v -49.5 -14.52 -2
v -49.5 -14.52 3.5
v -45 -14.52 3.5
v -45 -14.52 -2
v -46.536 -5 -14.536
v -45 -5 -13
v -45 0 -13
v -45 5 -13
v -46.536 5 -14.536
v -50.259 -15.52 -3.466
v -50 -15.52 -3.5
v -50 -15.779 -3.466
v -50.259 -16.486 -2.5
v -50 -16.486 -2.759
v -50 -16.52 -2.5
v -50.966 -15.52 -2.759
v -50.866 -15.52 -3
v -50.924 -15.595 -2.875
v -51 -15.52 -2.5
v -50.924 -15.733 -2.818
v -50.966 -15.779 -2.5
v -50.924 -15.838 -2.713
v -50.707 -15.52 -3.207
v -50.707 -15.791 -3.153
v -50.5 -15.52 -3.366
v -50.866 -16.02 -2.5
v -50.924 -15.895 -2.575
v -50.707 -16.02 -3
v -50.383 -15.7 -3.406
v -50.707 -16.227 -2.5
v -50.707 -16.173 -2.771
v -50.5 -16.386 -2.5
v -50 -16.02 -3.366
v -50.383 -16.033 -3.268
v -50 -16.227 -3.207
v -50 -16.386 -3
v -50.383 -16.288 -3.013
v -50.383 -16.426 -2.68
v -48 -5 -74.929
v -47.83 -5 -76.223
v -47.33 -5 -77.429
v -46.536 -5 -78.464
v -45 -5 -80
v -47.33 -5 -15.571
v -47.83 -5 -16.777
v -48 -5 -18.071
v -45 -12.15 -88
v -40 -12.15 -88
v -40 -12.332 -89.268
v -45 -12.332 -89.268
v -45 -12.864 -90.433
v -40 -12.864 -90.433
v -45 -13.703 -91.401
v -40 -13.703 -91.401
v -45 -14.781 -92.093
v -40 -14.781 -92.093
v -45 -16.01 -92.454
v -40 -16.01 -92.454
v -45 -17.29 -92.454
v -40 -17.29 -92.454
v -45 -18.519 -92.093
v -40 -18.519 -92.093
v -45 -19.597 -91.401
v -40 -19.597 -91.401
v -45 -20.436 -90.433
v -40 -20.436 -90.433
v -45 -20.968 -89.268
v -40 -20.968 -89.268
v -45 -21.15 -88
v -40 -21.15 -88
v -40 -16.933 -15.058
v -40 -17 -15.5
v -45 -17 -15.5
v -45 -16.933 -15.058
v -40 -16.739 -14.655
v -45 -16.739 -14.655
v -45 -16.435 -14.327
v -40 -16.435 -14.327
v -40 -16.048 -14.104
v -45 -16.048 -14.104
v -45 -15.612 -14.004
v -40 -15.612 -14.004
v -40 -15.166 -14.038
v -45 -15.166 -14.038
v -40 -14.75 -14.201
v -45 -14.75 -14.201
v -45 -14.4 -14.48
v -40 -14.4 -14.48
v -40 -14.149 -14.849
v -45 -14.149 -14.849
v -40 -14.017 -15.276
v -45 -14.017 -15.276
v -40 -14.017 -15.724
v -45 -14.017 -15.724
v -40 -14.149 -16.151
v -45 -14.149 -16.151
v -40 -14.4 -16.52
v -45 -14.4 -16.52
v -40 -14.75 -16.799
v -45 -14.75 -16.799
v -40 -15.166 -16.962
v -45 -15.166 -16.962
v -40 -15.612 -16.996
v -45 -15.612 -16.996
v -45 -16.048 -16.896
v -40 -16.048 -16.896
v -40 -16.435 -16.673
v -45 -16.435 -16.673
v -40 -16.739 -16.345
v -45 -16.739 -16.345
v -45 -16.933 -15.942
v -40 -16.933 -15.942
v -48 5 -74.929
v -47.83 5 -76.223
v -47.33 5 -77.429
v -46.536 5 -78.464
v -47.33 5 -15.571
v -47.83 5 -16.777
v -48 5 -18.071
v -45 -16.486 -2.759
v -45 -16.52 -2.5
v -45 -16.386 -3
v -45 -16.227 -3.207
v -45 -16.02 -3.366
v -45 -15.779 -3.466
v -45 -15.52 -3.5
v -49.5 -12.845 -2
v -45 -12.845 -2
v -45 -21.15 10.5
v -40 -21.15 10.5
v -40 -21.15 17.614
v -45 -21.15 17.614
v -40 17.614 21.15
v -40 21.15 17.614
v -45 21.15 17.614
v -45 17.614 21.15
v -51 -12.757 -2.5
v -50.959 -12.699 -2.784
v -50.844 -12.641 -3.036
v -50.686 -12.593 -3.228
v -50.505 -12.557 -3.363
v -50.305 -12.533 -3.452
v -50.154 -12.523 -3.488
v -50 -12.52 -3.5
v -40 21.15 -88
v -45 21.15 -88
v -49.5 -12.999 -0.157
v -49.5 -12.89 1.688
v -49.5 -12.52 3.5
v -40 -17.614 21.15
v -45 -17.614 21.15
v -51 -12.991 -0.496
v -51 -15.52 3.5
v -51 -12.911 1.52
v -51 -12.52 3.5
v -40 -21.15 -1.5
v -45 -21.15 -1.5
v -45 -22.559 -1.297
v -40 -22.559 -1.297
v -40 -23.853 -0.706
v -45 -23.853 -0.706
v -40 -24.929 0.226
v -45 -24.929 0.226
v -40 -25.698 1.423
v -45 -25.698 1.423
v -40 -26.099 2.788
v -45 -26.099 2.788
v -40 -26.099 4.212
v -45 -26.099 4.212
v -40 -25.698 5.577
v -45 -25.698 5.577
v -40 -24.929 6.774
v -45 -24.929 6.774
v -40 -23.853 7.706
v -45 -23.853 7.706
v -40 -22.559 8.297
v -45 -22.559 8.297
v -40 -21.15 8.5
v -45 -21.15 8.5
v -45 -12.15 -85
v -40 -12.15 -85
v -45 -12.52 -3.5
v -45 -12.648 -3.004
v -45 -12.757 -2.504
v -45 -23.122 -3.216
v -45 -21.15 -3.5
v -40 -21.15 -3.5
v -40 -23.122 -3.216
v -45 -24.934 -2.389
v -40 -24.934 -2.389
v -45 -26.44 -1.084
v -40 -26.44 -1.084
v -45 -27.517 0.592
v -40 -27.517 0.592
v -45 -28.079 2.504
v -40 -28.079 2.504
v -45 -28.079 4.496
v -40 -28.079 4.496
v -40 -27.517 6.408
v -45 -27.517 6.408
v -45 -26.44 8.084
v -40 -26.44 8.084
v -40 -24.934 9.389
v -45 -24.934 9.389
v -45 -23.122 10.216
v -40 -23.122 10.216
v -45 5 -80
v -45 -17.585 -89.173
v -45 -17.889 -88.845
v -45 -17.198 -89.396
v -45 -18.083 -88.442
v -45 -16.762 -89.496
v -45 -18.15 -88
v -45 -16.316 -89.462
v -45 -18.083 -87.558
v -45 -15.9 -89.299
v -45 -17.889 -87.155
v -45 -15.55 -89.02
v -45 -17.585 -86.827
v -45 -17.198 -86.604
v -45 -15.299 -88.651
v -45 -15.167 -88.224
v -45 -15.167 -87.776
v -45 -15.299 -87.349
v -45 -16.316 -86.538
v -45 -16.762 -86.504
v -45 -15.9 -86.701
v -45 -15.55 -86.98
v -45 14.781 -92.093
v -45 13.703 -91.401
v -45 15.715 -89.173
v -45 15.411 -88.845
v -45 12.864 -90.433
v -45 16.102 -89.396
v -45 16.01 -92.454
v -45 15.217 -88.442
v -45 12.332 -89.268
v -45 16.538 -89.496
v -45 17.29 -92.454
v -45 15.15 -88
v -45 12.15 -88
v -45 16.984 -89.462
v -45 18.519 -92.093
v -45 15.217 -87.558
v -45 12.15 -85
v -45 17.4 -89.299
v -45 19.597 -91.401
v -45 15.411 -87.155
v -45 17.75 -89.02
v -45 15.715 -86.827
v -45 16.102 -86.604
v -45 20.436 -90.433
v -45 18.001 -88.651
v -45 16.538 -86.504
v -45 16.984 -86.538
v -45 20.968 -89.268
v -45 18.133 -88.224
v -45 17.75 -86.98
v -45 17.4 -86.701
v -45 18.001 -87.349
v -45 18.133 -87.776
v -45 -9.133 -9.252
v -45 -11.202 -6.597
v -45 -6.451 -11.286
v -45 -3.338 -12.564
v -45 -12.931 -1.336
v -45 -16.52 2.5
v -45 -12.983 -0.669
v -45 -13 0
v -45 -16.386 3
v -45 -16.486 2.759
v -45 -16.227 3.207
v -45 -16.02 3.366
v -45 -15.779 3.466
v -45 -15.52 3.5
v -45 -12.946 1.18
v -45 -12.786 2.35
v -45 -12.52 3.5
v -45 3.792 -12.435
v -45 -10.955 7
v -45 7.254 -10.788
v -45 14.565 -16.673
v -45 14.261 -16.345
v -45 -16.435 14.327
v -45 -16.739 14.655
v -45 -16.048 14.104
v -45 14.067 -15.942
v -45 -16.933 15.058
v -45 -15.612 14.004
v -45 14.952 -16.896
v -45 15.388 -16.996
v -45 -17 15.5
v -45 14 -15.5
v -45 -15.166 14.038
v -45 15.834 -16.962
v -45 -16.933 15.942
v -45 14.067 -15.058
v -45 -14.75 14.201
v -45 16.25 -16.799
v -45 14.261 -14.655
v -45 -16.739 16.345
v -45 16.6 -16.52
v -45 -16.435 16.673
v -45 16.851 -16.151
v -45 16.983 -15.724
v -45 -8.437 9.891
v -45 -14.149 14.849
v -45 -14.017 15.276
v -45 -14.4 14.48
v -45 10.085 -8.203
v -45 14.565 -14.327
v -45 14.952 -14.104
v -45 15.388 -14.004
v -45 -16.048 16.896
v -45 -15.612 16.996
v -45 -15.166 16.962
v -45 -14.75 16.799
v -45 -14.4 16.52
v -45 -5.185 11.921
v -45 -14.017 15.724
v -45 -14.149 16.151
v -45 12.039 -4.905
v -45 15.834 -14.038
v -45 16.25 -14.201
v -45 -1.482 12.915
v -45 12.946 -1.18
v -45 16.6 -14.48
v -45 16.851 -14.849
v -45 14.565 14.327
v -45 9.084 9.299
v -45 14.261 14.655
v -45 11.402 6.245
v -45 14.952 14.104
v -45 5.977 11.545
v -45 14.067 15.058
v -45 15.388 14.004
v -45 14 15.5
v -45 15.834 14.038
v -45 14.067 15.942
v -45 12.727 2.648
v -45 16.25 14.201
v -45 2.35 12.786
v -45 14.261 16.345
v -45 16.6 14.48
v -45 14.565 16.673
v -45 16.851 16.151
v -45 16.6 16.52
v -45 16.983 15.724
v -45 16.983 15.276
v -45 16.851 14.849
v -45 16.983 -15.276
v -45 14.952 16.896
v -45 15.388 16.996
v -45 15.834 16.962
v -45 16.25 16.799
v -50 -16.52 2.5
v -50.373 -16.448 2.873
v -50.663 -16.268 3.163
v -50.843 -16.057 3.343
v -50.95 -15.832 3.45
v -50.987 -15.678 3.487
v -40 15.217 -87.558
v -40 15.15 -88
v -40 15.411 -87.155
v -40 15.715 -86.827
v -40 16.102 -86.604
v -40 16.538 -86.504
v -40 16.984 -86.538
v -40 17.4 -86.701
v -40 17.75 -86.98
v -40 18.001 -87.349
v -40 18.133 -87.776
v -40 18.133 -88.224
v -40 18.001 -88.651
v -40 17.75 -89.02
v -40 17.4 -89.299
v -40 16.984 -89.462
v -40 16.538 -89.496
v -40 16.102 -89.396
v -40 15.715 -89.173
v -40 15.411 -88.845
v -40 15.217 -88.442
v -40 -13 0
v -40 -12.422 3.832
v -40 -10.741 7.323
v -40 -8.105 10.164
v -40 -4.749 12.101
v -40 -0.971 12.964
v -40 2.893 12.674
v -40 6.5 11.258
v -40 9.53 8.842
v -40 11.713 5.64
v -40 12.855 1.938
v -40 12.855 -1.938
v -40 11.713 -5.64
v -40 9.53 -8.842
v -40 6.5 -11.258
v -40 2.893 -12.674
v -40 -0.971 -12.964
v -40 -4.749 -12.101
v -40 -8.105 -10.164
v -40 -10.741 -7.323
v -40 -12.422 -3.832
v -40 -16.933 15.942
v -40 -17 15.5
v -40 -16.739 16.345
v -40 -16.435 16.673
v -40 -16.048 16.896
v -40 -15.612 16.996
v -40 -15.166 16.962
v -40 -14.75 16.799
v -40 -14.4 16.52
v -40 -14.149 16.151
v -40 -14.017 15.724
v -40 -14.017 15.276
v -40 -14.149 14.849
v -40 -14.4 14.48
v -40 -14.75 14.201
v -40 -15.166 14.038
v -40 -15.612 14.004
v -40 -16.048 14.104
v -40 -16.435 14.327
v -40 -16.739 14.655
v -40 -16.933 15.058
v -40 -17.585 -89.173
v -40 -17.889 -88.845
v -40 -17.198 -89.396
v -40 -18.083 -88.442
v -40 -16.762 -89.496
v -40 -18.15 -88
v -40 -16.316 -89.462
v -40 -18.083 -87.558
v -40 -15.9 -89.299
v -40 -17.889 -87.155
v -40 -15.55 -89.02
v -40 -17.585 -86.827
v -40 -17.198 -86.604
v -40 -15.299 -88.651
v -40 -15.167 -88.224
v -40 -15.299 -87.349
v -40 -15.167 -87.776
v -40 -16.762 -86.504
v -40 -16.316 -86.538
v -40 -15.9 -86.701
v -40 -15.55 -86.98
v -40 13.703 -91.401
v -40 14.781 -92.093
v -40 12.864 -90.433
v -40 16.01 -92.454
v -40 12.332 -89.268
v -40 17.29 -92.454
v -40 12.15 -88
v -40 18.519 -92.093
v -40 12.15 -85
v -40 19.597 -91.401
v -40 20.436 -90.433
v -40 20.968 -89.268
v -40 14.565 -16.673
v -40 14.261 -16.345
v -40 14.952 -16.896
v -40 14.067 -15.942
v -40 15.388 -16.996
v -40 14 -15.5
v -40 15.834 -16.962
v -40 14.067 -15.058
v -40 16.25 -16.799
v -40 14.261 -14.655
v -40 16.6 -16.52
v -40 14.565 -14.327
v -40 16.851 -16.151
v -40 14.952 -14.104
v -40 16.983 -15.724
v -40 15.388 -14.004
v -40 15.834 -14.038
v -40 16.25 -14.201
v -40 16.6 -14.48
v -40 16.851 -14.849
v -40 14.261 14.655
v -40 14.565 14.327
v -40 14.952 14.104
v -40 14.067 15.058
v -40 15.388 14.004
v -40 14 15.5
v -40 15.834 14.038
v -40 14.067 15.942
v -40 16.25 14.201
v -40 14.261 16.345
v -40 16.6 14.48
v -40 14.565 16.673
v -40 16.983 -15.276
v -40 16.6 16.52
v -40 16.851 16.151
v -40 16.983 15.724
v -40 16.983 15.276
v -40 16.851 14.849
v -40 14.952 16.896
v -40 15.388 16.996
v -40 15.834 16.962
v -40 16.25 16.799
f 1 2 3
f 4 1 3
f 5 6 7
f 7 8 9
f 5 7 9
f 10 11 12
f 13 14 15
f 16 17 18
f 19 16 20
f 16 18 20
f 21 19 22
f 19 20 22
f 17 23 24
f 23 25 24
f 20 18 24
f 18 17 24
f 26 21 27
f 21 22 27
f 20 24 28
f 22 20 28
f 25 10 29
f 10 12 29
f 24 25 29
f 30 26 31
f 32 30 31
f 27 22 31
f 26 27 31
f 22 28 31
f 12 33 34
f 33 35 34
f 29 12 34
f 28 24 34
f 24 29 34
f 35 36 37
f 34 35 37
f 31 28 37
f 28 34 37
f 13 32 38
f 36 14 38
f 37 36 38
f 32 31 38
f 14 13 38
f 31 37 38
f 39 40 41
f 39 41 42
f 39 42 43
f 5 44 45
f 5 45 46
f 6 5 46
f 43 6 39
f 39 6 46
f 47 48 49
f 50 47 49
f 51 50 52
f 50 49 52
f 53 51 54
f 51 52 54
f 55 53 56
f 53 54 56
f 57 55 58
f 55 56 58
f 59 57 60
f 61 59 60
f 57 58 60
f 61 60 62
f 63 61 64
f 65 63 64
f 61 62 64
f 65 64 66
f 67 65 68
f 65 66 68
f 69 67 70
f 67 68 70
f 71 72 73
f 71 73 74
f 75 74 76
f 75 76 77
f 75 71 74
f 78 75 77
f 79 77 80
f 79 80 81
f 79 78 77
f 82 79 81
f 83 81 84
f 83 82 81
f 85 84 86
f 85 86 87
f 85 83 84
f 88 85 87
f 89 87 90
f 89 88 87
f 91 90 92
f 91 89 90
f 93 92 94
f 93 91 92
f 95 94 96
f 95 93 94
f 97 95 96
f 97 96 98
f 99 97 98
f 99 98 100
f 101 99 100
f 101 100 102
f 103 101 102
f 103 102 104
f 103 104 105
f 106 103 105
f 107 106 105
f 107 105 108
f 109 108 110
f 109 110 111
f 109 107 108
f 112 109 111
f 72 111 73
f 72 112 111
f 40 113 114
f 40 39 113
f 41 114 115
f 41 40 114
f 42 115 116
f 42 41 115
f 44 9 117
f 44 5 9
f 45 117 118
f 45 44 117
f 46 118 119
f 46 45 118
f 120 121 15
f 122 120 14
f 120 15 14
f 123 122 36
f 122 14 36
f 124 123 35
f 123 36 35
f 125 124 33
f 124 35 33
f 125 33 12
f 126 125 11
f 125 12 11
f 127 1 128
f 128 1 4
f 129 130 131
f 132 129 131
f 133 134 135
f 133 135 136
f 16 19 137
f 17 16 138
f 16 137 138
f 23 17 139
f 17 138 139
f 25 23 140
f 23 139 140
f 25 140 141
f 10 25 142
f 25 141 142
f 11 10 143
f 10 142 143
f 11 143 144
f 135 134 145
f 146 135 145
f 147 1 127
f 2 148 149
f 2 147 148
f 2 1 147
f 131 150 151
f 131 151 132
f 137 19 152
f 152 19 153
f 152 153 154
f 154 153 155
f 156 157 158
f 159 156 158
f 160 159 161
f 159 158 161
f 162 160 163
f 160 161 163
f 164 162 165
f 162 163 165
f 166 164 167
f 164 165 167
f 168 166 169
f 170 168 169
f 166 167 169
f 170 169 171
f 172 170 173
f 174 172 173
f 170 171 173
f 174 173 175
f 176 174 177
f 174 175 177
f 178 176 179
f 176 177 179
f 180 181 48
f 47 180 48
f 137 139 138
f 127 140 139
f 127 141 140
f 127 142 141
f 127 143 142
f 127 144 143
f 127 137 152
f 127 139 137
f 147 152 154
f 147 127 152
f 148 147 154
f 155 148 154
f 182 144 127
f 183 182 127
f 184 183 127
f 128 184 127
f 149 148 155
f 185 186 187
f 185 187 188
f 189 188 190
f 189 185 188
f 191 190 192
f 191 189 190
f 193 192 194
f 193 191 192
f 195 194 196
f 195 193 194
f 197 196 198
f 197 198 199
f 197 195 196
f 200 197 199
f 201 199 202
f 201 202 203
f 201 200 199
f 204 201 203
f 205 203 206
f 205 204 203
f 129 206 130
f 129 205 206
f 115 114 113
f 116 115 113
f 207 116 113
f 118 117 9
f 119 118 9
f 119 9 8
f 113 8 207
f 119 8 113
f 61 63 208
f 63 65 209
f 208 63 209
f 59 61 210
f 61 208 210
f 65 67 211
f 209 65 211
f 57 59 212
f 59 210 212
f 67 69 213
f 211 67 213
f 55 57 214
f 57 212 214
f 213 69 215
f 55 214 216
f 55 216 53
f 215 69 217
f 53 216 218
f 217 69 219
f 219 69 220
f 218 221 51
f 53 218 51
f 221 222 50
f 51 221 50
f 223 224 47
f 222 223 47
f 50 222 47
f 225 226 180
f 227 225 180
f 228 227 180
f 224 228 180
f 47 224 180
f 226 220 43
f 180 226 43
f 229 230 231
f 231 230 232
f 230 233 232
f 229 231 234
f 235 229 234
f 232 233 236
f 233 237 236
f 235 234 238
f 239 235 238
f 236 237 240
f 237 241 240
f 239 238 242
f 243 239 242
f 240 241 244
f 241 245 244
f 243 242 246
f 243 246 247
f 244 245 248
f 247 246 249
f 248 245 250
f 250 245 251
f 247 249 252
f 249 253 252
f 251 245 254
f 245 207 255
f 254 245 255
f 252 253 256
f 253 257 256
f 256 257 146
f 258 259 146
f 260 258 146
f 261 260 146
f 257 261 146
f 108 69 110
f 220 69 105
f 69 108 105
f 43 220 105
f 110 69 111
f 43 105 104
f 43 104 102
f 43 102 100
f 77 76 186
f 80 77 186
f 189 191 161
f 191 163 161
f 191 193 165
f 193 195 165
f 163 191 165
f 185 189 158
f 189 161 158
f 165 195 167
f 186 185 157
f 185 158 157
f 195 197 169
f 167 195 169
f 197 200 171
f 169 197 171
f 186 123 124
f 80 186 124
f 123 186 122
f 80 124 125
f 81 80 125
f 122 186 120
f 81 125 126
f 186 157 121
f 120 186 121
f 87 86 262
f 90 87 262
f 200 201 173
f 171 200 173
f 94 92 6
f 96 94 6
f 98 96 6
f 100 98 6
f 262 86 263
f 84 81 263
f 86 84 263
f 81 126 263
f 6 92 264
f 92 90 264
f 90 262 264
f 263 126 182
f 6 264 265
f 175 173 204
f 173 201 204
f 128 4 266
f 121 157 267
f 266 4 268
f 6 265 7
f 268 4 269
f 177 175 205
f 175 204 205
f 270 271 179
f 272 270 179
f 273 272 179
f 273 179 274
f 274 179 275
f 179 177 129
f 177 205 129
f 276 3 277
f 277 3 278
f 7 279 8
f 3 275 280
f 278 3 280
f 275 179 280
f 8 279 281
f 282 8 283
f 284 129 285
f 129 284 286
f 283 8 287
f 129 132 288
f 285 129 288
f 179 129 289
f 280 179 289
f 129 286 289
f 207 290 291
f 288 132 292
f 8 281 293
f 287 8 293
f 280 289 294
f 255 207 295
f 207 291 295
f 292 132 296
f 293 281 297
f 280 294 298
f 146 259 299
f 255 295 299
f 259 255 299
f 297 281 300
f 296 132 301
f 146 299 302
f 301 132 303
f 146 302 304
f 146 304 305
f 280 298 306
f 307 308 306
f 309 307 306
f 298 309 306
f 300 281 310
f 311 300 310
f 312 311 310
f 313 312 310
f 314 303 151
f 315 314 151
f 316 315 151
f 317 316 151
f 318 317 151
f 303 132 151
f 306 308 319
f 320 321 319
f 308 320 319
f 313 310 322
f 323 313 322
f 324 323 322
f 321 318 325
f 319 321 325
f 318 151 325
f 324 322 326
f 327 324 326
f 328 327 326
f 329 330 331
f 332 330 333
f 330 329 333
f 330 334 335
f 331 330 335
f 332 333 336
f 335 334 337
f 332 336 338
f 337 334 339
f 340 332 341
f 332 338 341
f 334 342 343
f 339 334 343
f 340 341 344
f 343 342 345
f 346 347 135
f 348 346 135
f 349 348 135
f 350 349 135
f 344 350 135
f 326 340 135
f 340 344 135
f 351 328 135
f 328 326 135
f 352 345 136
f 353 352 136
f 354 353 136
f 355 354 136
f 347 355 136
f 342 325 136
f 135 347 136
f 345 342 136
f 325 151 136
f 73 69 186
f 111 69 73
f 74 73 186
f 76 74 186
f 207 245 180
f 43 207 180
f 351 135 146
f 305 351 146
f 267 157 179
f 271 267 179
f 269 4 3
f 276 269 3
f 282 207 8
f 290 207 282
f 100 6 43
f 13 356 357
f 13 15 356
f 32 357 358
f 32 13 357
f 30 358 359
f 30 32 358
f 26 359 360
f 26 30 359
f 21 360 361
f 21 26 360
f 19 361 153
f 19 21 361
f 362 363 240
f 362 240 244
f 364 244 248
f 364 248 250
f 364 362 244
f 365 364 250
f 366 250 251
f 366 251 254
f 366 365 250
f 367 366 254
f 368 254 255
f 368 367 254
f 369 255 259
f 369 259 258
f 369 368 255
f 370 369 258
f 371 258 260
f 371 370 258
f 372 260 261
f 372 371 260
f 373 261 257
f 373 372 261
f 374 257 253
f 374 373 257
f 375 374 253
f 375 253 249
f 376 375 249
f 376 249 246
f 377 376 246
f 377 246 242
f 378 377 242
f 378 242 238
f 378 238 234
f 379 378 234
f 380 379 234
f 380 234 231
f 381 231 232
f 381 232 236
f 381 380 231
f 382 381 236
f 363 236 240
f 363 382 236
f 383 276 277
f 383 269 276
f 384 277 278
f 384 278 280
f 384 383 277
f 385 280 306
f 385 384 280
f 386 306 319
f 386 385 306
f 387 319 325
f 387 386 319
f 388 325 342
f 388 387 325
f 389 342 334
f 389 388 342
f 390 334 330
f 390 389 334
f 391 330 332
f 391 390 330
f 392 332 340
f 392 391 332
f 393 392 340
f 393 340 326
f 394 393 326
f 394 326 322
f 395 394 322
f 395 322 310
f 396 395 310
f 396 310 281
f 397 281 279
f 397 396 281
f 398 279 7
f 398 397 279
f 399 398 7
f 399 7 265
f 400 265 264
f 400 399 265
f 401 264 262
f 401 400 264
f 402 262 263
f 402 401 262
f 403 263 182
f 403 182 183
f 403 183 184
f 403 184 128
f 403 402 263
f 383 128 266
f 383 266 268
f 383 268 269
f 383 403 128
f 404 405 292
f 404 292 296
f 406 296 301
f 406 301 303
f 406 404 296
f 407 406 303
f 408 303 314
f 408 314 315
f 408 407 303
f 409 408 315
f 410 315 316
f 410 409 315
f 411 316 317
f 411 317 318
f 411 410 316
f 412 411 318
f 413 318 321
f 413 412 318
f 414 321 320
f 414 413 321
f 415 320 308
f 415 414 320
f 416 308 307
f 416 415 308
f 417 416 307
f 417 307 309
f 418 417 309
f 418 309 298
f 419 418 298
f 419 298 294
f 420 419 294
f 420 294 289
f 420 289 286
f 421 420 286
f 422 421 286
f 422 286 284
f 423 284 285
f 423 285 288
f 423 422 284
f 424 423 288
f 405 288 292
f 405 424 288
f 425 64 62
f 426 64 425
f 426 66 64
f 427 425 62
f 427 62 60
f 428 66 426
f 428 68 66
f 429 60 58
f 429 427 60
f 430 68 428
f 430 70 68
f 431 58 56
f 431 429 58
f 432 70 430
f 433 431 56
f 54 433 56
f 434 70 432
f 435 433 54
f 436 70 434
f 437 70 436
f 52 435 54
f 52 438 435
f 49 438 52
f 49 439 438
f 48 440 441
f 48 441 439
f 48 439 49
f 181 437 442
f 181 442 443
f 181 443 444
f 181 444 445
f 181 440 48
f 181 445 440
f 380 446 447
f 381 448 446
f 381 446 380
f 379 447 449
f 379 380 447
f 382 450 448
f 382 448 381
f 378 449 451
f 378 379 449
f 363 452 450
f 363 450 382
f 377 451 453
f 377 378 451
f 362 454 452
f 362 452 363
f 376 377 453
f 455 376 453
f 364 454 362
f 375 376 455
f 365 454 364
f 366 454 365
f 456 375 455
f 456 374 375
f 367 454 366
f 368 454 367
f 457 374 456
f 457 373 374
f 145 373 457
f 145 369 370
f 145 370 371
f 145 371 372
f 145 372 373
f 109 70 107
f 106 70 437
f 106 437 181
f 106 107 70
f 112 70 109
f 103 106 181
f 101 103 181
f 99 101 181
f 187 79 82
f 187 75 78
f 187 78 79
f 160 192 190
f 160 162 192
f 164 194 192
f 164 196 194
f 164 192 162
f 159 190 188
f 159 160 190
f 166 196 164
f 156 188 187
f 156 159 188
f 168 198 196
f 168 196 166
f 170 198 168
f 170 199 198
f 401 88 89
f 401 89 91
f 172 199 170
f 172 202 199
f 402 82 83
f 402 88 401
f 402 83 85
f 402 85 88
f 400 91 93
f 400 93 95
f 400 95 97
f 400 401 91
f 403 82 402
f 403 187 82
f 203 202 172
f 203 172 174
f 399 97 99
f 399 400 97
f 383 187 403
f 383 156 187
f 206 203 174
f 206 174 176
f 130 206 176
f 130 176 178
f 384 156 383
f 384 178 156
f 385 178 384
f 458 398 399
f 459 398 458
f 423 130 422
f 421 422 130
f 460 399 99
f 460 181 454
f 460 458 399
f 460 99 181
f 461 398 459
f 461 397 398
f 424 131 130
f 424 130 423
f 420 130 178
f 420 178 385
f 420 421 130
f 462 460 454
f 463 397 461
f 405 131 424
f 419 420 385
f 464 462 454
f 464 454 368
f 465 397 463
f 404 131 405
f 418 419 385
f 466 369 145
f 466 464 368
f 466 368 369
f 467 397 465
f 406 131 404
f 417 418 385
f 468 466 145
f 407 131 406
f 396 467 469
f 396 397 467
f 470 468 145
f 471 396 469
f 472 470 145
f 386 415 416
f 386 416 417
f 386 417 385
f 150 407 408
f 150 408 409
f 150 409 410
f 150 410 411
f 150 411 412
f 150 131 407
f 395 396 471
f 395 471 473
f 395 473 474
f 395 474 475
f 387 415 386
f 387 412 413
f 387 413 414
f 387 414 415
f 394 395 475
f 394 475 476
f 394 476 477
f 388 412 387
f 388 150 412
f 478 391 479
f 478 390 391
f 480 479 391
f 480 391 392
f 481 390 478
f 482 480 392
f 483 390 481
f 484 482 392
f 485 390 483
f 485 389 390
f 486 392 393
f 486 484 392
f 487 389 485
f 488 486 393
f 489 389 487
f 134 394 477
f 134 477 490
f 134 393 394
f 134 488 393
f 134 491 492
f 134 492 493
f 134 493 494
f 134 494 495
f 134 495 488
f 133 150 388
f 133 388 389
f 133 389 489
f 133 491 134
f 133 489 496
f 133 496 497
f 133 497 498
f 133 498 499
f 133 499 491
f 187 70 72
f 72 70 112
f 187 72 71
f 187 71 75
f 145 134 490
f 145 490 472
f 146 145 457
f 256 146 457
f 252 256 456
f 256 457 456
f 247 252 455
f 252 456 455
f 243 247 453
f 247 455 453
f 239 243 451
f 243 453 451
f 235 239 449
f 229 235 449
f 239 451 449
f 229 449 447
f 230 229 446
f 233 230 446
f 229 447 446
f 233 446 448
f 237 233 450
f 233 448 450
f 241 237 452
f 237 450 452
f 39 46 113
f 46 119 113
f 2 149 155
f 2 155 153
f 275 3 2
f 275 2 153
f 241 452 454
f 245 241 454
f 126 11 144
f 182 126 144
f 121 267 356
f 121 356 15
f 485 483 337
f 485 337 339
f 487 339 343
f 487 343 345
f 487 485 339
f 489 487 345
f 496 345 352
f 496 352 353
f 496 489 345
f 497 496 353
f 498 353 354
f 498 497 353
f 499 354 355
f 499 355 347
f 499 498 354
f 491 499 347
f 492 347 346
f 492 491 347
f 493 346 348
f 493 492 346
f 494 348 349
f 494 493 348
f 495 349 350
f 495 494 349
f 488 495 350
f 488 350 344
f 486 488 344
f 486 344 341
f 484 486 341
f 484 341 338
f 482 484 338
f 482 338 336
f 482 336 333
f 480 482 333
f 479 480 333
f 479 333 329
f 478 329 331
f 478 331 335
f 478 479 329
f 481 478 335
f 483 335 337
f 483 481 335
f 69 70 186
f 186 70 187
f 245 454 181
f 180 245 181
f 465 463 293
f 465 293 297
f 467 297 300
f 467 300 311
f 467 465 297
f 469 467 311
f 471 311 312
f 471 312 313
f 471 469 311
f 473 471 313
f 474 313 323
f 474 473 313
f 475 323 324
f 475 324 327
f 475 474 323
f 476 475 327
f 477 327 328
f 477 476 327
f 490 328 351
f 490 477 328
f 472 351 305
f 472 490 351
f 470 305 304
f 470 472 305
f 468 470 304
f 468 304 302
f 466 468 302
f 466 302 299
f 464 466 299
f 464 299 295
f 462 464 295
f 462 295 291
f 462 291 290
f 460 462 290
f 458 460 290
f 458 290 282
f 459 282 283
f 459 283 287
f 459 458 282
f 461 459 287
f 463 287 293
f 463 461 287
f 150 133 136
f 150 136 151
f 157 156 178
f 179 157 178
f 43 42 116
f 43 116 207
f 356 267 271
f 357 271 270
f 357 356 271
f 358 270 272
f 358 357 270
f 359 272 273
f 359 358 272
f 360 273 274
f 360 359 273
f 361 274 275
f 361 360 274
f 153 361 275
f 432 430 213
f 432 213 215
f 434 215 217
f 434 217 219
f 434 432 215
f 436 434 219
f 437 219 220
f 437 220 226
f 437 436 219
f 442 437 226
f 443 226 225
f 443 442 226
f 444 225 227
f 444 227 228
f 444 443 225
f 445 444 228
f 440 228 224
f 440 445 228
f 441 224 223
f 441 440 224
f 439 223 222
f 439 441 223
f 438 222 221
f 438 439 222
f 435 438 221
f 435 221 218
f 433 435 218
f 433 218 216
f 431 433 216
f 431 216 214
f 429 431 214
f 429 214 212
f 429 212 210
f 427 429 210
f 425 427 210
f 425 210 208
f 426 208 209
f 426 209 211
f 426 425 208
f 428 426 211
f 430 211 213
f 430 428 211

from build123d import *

# Parameters (mm, degrees)
SKETCH009_R     = 1.5
SKETCH009_R_2   = 13
PAD007_DEPTH    = 5
PAD028_DEPTH    = 6
SKETCH071_W     = 4.5
SKETCH071_H     = 5.5
POCKET019_DEPTH = 2
FILLET002_R     = 1
PAD032_DEPTH    = 5
FILLET003_R     = 5
PAD035_DEPTH    = 5


with BuildPart() as part:
    # Sketch009 (on Face1 of Binder012) → Pad007 (new body)
    with BuildSketch(Plane(origin=(-40, 0, 0), x_dir=(0, -1, 0), z_dir=(-1, 0, 0))):
        with BuildLine():
            Line((-21.15, -17.6144660941), (-21.15, 17.6144660941))
            Line((-21.15, 17.6144660941), (-17.6144660941, 21.15))
            Line((-17.6144660941, 21.15), (17.6144660941, 21.15))
            Line((17.6144660941, 21.15), (21.15, 17.6144660941))
            Line((21.15, 17.6144660941), (21.15, -17.6144660941))
            Line((21.15, -17.6144660941), (21.15, -85))
            Line((21.15, -88), (21.15, -85))
            ThreePointArc((12.15, -88), (16.65, -92.5), (21.15, -88))
            Line((12.15, -85), (12.15, -88))
            Line((-12.15, -85), (12.15, -85))
            Line((-12.15, -88), (-12.15, -85))
            ThreePointArc((-21.15, -88), (-16.65, -92.5), (-12.15, -88))
            Line((-21.15, -85), (-21.15, -88))
            Line((-21.15, -85), (-21.15, -17.6144660941))
        make_face()
        with Locations((-15.5, 15.5)):
            Circle(SKETCH009_R, mode=Mode.SUBTRACT)
        with Locations((15.5, 15.5)):
            Circle(SKETCH009_R, mode=Mode.SUBTRACT)
        with Locations((15.5, -15.5)):
            Circle(SKETCH009_R, mode=Mode.SUBTRACT)
        with Locations((-15.5, -15.5)):
            Circle(SKETCH009_R, mode=Mode.SUBTRACT)
        Circle(SKETCH009_R_2, mode=Mode.SUBTRACT)
        with Locations((-16.65, -88)):
            Circle(SKETCH009_R, mode=Mode.SUBTRACT)
        with Locations((16.65, -88)):
            Circle(SKETCH009_R, mode=Mode.SUBTRACT)
    extrude(amount=PAD007_DEPTH)

    # Sketch070 (on Face23 of Pad007) → Pad028 (join)
    with BuildSketch(Plane(origin=(-45, 0, 0), x_dir=(0, -1, 0), z_dir=(-1, 0, 0))):
        with BuildLine():
            ThreePointArc((12.5199840255, -3.5), (13, 0), (12.5199840255, 3.5))
            Line((12.5199840255, 3.5), (16.5199840255, 3.5))
            Line((16.5199840255, 3.5), (16.5199840255, -3.5))
            Line((16.5199840255, -3.5), (12.5199840255, -3.5))
        make_face()
    extrude(amount=PAD028_DEPTH)

    # Sketch071 (on Face25 of Pad028) → Pocket019 (cut)
    with BuildSketch(Plane.XZ.offset(14.5199840255)):
        with Locations((-47.25, 0.75)):
            Rectangle(SKETCH071_W, SKETCH071_H)
    extrude(amount=-POCKET019_DEPTH, mode=Mode.SUBTRACT)

    # Fillet002
    fillet002_edges = [part.edges().sort_by_distance(p)[0] for p in [
        (-48, -16.519984, 3.5),
        (-48, -16.519984, -3.5),
        (-51, -14.519984, -3.5),
        (-51, -16.519984, 0),
    ]]
    fillet(fillet002_edges, radius=FILLET002_R)

    # Sketch077 (on DatumPlane) → Pad032 (join, symmetric)
    with BuildSketch(Plane(origin=(-44.1666666667, 0, 14.1), x_dir=(-1, 0, 0), z_dir=(0, 1, 0))):
        Polygon((0.8333333333, -27.1), (3.8333333333, -30.1), (3.8333333333, -91.1), (0.8333333333, -94.1), align=None)
    extrude(amount=PAD032_DEPTH, both=True)

    # Fillet003
    fillet003_edges = [part.edges().sort_by_distance(p)[0] for p in [
        (-48, 0, -16),
        (-48, 0, -77),
    ]]
    fillet(fillet003_edges, radius=FILLET003_R)

    # Sketch085 (on Face4 of Fillet003) → Pad035 (join)
    with BuildSketch(Plane(origin=(-45, 0, 0), x_dir=(0, -1, 0), z_dir=(-1, 0, 0))):
        with BuildLine():
            ThreePointArc((21.15, -1.5), (26.15, 3.5), (21.15, 8.5))
            Line((21.15, 10.5), (21.15, 8.5))
            ThreePointArc((21.15, -3.5), (28.15, 3.5), (21.15, 10.5))
            Line((21.15, -1.5), (21.15, -3.5))
        make_face()
    extrude(amount=-PAD035_DEPTH)


solid = part.part
